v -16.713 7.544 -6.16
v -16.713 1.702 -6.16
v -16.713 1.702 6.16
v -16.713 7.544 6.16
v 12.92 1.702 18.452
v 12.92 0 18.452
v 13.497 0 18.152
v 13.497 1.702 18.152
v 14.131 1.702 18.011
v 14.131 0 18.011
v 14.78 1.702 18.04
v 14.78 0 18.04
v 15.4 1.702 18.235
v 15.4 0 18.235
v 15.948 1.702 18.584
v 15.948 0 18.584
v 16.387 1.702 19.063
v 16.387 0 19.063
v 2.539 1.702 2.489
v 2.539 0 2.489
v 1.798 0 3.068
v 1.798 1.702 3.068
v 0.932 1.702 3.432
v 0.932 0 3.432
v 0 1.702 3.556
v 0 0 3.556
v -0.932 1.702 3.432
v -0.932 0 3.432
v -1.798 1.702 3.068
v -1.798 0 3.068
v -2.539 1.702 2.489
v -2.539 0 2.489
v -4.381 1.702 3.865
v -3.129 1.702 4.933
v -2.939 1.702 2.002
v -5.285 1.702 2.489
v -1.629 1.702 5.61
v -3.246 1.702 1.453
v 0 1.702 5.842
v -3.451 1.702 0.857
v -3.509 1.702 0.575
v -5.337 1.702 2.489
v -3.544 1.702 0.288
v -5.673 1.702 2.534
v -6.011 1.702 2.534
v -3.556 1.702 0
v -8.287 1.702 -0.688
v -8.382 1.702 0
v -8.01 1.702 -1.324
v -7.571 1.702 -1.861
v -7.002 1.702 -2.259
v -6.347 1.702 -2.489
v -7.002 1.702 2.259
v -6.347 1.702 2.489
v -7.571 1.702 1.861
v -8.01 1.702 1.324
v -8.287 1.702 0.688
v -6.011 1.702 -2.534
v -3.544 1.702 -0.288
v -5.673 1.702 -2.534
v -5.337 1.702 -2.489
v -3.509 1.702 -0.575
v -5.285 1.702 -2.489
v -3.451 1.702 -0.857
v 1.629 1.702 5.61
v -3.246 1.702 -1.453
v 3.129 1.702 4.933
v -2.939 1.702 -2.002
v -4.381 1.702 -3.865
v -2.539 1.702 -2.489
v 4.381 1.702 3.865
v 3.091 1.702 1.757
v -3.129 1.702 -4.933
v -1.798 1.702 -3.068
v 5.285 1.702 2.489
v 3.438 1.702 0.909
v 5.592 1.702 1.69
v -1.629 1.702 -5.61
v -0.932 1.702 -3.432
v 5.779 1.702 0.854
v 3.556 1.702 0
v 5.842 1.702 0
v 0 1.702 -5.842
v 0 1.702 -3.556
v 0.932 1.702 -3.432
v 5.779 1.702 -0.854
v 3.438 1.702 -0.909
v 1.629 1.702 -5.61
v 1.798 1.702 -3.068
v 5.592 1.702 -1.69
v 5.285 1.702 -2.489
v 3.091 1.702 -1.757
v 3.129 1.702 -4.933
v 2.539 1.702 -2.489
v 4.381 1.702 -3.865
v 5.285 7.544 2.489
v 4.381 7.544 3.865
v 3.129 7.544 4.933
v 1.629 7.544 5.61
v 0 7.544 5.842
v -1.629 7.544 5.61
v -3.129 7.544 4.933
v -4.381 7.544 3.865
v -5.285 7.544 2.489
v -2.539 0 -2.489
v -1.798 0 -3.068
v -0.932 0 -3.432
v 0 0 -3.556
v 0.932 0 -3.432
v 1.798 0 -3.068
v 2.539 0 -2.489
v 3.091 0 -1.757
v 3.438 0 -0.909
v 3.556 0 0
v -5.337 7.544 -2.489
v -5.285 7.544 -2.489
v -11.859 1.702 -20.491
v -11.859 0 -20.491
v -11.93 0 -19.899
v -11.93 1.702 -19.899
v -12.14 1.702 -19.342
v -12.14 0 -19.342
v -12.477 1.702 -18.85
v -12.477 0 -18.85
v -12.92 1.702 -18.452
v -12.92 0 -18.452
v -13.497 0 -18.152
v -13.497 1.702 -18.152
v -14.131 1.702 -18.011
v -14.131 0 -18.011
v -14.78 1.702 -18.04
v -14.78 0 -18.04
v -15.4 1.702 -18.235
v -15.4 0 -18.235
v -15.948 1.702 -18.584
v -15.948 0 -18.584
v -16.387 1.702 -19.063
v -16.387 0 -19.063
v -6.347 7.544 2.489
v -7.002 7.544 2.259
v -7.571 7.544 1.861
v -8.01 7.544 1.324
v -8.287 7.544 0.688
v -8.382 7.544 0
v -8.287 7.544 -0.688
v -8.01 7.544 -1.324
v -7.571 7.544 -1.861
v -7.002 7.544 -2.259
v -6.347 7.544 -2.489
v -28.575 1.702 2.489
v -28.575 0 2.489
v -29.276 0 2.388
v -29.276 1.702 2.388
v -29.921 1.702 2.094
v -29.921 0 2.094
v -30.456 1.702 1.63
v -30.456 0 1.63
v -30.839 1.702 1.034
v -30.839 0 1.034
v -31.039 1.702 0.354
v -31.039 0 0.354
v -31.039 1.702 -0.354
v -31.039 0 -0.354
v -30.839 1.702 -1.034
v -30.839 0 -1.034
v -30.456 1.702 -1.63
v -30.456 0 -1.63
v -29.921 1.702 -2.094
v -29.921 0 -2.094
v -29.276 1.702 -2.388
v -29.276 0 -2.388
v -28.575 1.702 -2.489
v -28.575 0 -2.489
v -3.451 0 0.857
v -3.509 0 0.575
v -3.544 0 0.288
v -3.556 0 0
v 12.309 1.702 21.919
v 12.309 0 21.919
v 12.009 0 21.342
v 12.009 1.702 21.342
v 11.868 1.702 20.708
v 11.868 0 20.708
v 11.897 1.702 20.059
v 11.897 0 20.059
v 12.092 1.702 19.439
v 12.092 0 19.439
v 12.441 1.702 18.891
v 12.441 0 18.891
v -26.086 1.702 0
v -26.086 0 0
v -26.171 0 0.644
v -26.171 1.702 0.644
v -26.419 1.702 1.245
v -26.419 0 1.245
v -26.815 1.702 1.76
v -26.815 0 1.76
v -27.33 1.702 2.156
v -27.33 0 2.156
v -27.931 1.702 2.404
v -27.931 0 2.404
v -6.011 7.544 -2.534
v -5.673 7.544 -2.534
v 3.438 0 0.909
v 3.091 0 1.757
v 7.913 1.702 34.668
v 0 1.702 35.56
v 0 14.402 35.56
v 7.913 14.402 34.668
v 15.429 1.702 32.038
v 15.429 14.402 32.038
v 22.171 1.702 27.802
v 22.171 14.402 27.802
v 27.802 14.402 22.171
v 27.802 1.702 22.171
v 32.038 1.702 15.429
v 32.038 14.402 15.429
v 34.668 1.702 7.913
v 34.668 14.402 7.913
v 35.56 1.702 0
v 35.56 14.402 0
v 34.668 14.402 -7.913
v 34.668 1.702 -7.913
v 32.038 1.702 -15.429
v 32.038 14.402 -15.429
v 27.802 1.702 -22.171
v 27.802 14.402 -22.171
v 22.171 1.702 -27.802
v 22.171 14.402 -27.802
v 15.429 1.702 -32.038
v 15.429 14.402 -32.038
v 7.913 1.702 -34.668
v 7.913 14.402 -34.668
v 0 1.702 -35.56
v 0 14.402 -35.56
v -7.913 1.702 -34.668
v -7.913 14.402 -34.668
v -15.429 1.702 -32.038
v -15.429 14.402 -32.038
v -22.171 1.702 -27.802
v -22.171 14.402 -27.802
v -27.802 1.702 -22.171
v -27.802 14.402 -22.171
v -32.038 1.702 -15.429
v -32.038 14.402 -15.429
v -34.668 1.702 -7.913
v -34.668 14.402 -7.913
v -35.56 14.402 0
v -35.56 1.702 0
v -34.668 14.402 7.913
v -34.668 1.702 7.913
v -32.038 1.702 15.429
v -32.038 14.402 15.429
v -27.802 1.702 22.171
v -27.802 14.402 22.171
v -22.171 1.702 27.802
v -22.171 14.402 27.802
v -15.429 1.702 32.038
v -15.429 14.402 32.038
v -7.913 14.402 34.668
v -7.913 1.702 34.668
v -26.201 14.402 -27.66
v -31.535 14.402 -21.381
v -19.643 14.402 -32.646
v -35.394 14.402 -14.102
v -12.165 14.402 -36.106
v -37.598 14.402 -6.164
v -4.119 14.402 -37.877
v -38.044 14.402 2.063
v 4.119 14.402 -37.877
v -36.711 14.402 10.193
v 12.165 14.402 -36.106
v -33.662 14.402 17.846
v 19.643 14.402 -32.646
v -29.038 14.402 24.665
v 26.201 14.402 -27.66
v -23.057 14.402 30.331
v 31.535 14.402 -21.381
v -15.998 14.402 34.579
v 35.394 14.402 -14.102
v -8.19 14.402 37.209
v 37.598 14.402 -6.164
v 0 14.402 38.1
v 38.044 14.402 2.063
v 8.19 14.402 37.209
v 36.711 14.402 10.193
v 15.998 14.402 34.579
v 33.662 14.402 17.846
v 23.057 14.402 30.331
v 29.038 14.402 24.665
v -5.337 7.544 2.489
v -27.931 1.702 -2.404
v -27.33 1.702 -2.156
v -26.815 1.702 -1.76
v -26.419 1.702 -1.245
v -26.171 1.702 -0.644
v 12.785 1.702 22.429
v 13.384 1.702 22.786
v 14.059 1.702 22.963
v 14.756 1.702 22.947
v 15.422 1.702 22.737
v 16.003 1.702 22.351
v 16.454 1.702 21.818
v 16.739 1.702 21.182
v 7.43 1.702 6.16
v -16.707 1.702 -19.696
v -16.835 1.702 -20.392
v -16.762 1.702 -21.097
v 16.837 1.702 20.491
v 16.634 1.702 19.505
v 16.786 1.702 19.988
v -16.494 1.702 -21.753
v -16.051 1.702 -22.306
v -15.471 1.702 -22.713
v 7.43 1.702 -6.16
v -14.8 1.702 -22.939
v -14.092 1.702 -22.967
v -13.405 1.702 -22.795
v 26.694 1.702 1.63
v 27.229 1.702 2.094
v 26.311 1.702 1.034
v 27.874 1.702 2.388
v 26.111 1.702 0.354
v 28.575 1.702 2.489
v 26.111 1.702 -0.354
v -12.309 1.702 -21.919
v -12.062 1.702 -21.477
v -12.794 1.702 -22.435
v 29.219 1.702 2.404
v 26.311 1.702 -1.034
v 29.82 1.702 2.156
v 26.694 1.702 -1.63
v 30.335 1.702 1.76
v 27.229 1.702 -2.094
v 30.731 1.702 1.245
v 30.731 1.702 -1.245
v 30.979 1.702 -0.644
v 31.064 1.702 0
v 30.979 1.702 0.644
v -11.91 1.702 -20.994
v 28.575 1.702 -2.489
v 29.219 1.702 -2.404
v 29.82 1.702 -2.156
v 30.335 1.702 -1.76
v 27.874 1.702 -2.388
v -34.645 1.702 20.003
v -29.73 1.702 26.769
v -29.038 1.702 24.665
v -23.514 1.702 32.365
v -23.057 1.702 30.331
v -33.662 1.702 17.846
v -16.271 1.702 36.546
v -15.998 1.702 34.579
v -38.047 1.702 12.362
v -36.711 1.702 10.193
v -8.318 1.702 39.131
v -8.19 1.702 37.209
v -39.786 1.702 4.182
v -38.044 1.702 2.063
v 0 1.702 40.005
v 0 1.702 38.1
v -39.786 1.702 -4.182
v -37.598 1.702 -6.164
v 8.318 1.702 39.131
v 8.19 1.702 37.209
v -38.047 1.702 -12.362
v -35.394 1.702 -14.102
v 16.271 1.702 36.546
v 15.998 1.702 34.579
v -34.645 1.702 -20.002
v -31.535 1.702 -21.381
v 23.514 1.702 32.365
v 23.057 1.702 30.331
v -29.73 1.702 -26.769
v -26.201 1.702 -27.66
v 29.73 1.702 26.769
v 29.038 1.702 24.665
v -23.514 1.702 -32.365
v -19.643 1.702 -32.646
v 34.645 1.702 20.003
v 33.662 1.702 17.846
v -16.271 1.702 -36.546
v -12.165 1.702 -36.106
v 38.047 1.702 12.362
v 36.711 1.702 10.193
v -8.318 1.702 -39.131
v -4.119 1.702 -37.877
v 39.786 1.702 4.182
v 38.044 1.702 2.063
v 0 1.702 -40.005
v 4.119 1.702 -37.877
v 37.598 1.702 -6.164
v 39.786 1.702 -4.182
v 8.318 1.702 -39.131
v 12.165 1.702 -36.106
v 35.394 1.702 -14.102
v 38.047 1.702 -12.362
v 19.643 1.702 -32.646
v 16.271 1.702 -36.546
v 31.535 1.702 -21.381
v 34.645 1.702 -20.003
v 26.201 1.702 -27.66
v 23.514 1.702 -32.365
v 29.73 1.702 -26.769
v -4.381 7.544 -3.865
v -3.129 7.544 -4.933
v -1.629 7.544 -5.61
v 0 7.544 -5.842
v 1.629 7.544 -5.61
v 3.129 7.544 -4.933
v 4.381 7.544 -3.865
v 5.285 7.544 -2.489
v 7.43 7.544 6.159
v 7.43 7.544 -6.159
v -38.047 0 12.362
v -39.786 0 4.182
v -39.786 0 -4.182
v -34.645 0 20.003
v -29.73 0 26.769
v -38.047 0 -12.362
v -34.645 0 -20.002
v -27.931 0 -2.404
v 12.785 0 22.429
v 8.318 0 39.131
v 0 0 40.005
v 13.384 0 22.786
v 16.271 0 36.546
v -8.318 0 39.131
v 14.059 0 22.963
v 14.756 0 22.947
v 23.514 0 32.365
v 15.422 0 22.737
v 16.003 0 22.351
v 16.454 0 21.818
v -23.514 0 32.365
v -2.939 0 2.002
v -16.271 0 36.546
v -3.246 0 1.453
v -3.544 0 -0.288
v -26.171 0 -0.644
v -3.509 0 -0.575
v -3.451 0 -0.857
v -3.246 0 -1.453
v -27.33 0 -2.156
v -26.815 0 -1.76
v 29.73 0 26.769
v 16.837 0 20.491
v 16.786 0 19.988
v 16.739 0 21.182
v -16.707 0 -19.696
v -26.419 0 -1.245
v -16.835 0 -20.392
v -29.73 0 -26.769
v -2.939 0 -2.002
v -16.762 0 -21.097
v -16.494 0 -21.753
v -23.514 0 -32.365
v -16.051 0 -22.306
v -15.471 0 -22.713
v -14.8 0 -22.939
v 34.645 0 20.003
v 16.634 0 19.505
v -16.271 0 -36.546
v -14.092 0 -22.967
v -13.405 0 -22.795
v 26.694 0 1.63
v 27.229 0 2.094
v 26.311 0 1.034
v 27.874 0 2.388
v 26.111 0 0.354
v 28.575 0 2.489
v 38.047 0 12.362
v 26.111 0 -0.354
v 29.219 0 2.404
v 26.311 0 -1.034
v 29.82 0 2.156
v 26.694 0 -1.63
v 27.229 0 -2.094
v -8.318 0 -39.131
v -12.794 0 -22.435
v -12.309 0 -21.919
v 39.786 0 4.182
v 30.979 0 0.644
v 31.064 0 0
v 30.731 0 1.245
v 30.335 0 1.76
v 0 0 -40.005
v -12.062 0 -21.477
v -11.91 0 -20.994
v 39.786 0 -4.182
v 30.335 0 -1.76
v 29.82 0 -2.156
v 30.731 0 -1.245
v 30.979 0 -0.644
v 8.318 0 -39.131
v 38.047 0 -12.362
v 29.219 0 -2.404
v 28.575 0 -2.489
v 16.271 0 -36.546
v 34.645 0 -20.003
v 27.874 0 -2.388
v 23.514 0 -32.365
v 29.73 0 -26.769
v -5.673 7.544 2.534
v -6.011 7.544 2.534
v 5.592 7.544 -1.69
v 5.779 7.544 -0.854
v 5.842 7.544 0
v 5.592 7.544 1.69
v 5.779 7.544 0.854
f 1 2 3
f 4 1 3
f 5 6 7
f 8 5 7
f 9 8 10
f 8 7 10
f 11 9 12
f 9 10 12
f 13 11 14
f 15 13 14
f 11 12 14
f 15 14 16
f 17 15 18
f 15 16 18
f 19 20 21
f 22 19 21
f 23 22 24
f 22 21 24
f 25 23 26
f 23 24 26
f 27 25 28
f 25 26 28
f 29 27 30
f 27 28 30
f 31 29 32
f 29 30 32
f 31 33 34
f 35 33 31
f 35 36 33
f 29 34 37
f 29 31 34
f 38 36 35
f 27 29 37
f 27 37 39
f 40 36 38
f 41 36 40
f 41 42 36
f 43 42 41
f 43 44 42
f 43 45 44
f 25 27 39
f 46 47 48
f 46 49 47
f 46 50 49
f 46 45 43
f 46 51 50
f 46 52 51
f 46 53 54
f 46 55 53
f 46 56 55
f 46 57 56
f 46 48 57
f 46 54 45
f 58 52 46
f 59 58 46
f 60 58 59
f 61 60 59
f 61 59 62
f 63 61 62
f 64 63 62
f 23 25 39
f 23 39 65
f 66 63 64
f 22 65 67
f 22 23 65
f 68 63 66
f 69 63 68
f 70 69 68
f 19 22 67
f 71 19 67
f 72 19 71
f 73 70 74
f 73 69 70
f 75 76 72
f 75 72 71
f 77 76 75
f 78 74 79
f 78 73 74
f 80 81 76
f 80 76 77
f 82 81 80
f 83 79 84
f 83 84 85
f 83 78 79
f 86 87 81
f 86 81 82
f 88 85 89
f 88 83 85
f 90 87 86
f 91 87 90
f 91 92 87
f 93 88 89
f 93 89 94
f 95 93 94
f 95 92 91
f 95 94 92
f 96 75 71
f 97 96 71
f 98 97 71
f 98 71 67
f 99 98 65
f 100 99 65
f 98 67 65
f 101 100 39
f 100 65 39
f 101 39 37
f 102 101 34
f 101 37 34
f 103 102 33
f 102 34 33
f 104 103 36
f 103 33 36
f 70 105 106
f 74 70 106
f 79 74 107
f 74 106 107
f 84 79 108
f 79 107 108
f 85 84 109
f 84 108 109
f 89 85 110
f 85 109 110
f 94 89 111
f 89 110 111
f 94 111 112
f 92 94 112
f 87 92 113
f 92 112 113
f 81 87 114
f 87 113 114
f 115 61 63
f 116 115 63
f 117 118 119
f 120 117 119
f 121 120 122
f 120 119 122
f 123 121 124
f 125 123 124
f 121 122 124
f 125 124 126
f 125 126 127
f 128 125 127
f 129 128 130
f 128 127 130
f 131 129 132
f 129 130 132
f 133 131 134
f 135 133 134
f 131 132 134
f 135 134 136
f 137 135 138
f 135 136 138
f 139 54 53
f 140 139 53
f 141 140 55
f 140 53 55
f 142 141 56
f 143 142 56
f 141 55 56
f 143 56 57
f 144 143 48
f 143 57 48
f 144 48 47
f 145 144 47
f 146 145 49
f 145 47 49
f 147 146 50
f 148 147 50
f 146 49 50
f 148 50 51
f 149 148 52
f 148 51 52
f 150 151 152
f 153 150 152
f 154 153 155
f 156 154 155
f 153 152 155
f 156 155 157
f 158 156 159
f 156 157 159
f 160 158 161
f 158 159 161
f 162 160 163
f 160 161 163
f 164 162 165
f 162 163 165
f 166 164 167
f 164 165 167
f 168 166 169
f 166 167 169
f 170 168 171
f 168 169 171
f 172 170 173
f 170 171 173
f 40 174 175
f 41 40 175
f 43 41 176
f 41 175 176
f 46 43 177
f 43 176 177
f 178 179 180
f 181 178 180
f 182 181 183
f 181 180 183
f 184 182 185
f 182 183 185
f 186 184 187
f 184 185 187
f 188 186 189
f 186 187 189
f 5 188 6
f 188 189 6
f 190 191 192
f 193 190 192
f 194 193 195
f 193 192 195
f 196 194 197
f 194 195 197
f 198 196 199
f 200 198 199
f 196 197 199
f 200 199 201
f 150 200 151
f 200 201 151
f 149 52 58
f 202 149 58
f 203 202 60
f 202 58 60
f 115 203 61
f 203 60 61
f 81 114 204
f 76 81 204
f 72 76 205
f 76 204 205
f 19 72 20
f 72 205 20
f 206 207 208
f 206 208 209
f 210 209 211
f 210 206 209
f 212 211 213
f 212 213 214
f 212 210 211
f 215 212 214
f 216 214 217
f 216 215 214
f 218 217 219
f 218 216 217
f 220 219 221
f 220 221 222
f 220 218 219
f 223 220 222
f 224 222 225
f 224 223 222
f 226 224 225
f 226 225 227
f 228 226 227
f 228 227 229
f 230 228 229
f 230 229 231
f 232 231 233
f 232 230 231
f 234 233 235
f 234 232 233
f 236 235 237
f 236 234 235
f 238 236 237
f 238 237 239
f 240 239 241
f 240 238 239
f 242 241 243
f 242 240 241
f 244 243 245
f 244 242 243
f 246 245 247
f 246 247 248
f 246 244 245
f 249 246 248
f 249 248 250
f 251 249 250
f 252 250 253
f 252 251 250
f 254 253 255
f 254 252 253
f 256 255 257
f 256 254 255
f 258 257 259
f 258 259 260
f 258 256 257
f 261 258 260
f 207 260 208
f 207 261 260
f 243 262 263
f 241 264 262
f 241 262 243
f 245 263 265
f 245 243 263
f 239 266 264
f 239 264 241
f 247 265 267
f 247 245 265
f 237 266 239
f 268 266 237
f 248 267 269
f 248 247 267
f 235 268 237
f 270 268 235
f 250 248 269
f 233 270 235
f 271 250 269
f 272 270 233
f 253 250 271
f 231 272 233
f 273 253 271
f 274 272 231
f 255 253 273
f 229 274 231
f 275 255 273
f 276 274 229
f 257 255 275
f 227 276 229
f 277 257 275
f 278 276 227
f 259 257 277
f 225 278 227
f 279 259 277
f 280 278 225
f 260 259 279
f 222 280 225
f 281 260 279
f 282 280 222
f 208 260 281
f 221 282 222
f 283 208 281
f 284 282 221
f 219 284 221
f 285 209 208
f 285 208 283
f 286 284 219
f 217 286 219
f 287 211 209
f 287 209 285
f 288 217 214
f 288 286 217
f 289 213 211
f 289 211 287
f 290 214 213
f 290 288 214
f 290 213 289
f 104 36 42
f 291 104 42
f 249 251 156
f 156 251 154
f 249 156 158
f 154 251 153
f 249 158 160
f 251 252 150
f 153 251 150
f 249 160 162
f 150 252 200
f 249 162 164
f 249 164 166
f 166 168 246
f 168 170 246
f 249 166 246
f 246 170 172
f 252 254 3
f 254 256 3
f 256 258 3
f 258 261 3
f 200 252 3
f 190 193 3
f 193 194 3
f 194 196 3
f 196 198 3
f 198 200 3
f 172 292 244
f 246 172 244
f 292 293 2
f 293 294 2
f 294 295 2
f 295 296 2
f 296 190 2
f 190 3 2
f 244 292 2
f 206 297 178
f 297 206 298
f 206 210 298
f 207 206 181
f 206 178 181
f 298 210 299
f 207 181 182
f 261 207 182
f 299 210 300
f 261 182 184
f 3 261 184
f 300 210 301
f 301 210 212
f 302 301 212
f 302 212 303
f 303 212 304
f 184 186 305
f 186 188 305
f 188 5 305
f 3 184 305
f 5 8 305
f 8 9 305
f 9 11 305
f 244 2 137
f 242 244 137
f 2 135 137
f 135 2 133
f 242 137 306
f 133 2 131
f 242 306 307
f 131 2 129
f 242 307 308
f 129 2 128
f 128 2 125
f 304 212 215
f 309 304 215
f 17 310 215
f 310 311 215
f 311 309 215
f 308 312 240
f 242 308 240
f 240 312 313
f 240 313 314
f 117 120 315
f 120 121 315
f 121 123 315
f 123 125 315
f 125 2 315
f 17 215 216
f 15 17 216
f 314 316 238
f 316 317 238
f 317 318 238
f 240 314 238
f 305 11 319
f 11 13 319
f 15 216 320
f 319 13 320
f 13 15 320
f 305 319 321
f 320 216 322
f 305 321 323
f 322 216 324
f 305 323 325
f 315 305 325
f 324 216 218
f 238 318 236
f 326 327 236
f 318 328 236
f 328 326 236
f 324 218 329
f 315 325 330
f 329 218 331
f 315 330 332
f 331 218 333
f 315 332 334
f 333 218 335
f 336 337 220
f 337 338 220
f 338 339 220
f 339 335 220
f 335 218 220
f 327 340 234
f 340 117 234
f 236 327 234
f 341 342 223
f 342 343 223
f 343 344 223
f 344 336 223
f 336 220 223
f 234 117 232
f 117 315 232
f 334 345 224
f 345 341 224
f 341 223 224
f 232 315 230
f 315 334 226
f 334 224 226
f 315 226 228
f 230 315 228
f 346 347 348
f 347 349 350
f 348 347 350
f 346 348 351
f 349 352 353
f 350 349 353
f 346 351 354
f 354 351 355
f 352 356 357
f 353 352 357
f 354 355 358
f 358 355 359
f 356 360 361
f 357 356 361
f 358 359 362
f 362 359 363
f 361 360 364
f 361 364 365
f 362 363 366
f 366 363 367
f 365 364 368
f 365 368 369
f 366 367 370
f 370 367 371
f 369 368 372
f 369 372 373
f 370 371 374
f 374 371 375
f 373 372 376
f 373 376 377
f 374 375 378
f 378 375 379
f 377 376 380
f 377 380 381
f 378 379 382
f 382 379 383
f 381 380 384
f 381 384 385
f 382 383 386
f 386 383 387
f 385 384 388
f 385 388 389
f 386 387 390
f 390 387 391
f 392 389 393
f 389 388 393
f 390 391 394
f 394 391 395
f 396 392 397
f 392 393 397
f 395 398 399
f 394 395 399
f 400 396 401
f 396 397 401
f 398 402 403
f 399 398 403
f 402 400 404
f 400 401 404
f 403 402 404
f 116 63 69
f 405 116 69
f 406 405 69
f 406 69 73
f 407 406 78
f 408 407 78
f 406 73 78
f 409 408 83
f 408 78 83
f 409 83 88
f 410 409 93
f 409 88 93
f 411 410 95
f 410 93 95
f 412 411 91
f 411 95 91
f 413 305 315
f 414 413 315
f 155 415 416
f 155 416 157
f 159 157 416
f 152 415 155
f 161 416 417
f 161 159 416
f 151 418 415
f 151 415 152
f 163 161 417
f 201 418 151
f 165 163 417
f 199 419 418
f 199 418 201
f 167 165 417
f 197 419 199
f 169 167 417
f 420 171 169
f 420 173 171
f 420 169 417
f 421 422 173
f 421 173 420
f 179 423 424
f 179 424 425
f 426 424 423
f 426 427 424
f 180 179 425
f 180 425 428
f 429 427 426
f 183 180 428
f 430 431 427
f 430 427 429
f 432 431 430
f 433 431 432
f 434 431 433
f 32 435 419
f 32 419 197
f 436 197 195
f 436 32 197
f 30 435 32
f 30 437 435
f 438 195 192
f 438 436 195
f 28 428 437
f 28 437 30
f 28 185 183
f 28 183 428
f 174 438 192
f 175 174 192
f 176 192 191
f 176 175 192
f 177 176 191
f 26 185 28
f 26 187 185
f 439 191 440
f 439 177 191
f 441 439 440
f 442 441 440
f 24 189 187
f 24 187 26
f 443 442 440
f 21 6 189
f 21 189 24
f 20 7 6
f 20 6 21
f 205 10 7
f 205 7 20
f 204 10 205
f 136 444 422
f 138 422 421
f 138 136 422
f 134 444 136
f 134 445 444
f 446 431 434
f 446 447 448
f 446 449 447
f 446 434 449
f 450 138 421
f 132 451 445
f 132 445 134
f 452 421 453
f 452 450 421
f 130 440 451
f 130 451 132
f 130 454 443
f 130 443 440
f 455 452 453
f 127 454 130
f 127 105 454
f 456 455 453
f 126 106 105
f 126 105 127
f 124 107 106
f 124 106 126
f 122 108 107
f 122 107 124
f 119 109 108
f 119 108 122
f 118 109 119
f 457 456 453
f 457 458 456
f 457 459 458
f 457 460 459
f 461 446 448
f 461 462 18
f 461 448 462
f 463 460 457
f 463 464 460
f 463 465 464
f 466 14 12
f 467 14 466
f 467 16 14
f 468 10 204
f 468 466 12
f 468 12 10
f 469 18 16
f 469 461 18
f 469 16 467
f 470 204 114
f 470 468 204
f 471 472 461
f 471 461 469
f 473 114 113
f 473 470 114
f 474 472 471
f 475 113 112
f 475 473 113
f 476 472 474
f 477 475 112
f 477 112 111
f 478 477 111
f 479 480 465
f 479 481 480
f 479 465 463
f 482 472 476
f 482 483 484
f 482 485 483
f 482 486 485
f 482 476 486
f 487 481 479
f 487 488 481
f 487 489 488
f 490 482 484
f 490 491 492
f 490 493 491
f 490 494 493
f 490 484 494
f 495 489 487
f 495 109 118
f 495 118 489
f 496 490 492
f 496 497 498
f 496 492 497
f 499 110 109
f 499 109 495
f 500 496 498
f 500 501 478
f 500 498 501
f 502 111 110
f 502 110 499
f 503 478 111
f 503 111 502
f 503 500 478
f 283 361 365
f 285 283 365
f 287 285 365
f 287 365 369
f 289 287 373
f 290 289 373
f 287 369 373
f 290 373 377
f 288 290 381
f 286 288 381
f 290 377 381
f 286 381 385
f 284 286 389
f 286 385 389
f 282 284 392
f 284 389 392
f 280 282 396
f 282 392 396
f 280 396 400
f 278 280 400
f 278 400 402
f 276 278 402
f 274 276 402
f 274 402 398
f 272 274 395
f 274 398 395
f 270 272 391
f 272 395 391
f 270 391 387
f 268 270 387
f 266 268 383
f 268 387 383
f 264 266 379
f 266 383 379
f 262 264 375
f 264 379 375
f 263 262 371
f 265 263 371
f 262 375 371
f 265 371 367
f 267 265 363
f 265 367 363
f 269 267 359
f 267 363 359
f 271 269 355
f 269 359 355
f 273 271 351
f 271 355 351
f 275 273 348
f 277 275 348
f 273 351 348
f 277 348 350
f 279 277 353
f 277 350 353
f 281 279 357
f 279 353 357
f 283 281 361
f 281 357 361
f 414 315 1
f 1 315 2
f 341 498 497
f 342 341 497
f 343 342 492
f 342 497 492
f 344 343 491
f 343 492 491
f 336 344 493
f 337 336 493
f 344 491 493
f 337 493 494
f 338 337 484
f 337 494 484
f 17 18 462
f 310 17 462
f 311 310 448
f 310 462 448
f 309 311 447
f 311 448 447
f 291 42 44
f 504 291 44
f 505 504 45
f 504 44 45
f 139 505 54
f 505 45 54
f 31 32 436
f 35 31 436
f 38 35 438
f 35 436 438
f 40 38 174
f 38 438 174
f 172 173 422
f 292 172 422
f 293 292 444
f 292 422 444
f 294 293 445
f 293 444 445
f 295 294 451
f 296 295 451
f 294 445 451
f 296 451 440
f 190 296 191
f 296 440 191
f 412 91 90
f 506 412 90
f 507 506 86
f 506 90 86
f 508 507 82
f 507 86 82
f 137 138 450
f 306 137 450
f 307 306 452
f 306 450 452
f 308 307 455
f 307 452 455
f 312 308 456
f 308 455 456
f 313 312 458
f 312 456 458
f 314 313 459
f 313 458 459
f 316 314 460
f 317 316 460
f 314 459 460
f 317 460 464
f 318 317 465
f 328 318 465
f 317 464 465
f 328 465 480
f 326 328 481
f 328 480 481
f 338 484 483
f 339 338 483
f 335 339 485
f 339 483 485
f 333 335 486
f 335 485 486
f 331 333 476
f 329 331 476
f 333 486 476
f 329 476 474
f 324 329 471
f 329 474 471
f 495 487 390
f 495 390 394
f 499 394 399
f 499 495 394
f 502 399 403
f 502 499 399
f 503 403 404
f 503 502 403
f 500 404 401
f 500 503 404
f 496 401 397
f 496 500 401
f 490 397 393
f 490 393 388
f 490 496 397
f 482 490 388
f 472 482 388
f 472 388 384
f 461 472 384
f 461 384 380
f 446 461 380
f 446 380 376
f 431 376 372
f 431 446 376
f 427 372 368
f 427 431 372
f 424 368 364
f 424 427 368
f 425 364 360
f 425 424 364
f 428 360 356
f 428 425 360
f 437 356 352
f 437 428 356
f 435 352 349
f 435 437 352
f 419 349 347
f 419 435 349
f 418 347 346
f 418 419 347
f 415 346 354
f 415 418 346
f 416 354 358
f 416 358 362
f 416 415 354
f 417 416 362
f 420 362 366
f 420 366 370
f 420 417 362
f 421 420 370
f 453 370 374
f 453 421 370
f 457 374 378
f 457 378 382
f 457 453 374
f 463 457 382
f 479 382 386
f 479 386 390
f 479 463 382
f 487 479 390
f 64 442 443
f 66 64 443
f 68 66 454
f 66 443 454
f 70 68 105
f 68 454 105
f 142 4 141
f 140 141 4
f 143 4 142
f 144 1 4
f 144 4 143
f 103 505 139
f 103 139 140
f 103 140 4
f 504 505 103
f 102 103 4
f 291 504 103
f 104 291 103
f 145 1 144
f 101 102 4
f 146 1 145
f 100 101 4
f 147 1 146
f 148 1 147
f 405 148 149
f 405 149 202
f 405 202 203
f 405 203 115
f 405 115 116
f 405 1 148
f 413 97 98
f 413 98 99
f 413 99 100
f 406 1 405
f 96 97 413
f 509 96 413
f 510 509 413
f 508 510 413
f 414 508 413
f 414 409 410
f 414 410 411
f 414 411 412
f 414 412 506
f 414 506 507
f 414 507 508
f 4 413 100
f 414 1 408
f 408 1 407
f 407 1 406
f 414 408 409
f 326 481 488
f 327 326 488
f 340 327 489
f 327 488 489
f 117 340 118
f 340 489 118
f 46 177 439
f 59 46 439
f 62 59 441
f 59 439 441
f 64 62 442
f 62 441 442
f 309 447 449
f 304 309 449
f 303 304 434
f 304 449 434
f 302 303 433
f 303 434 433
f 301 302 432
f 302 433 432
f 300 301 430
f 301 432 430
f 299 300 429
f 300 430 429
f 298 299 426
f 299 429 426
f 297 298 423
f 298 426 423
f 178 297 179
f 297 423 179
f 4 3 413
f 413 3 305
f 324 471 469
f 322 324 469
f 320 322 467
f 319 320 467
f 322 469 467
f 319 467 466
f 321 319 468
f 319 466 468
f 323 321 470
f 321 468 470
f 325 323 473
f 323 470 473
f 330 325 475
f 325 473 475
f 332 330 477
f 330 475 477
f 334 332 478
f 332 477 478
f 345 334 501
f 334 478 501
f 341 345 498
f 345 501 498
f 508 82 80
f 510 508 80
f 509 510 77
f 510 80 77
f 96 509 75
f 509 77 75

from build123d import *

# Parameters (mm, degrees)
SKETCH1_W           = 1.5875
SKETCH1_H           = 3.6703
BOSS_EXTRUDE1_DEPTH = 1.7018
BOSS_EXTRUDE2_START = 1.7018
SKETCH1_4_W         = 1.5875
SKETCH1_4_H         = 3.6703
BOSS_EXTRUDE2_DEPTH = 5.842
BOSS_EXTRUDE3_START = -7.5438
BOSS_EXTRUDE3_DEPTH = 1.7018
SKETCH5_R           = 40.005
BOSS_EXTRUDE5_DEPTH = 1.7018
SKETCH6_R           = 38.1
SKETCH6_R_2         = 35.56
BOSS_EXTRUDE6_DEPTH = 12.7


with BuildPart() as part:
    # Sketch1 → Boss-Extrude1 (new body)
    with BuildSketch(Plane(origin=(0, 0, 0), x_dir=(1, 0, 0), z_dir=(0, 1, 0))):
        with BuildLine():
            ThreePointArc((-24.13, 0), (-24.32485867, 1.301661891), (-24.892350361, 2.4892))
            Line((-24.892350361, 2.4892), (-28.575, 2.4892))
            ThreePointArc((-28.575, 2.4892), (-26.8148698, 1.7601302), (-26.0858, 0))
            ThreePointArc((-26.0858, 0), (-26.8148698, -1.7601302), (-28.575, -2.4892))
            Line((-28.575, -2.4892), (-24.892350361, -2.4892))
            ThreePointArc((-24.892350361, -2.4892), (-24.32485867, -1.301661891), (-24.13, 0))
        make_face()
        with BuildLine():
            Line((-28.575, 2.4892), (-24.892350361, 2.4892))
            ThreePointArc((-24.892350361, 2.4892), (-33.02, 0), (-24.892350361, -2.4892))
            Line((-24.892350361, -2.4892), (-28.575, -2.4892))
            ThreePointArc((-28.575, -2.4892), (-31.0642, 0), (-28.575, 2.4892))
        make_face()
        with BuildLine():
            ThreePointArc((-24.13, 0), (-24.32485867, 1.301661891), (-24.892350361, 2.4892))
            Line((-24.892350361, 2.4892), (-28.575, 2.4892))
            ThreePointArc((-28.575, 2.4892), (-26.8148698, 1.7601302), (-26.0858, 0))
            ThreePointArc((-26.0858, 0), (-26.8148698, -1.7601302), (-28.575, -2.4892))
            Line((-28.575, -2.4892), (-24.892350361, -2.4892))
            ThreePointArc((-24.892350361, -2.4892), (-24.32485867, -1.301661891), (-24.13, 0))
        make_face()
        with BuildLine():
            Line((-28.575, 2.4892), (-24.892350361, 2.4892))
            ThreePointArc((-24.892350361, 2.4892), (-33.02, 0), (-24.892350361, -2.4892))
            Line((-24.892350361, -2.4892), (-28.575, -2.4892))
            ThreePointArc((-28.575, -2.4892), (-31.0642, 0), (-28.575, 2.4892))
        make_face()
        with BuildLine():
            Line((-16.7132, 0), (-16.7132, 2.4892))
            Line((-16.7132, 2.4892), (-24.892350361, 2.4892))
            ThreePointArc((-24.892350361, 2.4892), (-24.32485867, 1.301661891), (-24.13, 0))
            ThreePointArc((-24.13, 0), (-24.32485867, -1.301661891), (-24.892350361, -2.4892))
            Line((-24.892350361, -2.4892), (-16.7132, -2.4892))
            Line((-16.7132, -2.4892), (-16.7132, 0))
        make_face()
        with BuildLine():
            Line((5.842, -6.1595), (5.842, -2.4892))
            Line((5.842, -2.4892), (5.285153485, -2.4892))
            ThreePointArc((5.285153485, -2.4892), (0, -5.842), (-5.285153485, -2.4892))
            Line((-5.285153485, -2.4892), (-5.336546382, -2.4892))
            ThreePointArc((-5.336546382, -2.4892), (-5.842, -2.54), (-6.347453618, -2.4892))
            Line((-6.347453618, -2.4892), (-16.7132, -2.4892))
            Line((-16.7132, -2.4892), (-16.7132, -6.1595))
            Line((-16.7132, -6.1595), (5.842, -6.1595))
        make_face()
        with BuildLine():
            Line((-16.7132, 0), (-16.7132, -2.4892))
            Line((-16.7132, -2.4892), (-6.347453618, -2.4892))
            ThreePointArc((-6.347453618, -2.4892), (-7.808653527, -1.607443282), (-8.382, 0))
            Line((-8.382, 0), (-16.7132, 0))
        make_face()
        with BuildLine():
            Line((-6.347453618, 2.4892), (-16.7132, 2.4892))
            Line((-16.7132, 2.4892), (-16.7132, 0))
            Line((-16.7132, 0), (-8.382, 0))
            ThreePointArc((-8.382, 0), (-7.808653527, 1.607443282), (-6.347453618, 2.4892))
        make_face()
        with BuildLine():
            Line((5.285153485, 2.4892), (5.842, 2.4892))
            Line((5.842, 2.4892), (5.842, 6.1595))
            Line((5.842, 6.1595), (-16.7132, 6.1595))
            Line((-16.7132, 6.1595), (-16.7132, 2.4892))
            Line((-16.7132, 2.4892), (-6.347453618, 2.4892))
            ThreePointArc((-6.347453618, 2.4892), (-5.842, 2.54), (-5.336546382, 2.4892))
            Line((-5.336546382, 2.4892), (-5.285153485, 2.4892))
            ThreePointArc((-5.285153485, 2.4892), (0, 5.842), (5.285153485, 2.4892))
        make_face()
        with Locations((6.63575, 4.32435)):
            Rectangle(SKETCH1_W, SKETCH1_H)
        with Locations((6.63575, -4.32435)):
            Rectangle(SKETCH1_W, SKETCH1_H)
        Polygon((5.842, 2.4892), (5.842, 0), (5.842, -2.4892), (7.4295, -2.4892), (7.4295, 2.4892), align=None)
        with BuildLine():
            ThreePointArc((5.285153485, 2.4892), (5.70108896, 1.275362172), (5.842, 0))
            Line((5.842, 0), (5.842, 2.4892))
            Line((5.842, 2.4892), (5.285153485, 2.4892))
        make_face()
        with BuildLine():
            Line((5.842, -2.4892), (5.842, 0))
            ThreePointArc((5.842, 0), (5.70108896, -1.275362172), (5.285153485, -2.4892))
            Line((5.285153485, -2.4892), (5.842, -2.4892))
        make_face()
        with BuildLine():
            ThreePointArc((5.285153485, -2.4892), (5.70108896, -1.275362172), (5.842, 0))
            Line((5.842, 0), (3.556, 0))
            ThreePointArc((3.556, 0), (3.292079083, -1.344377668), (2.539491949, -2.4892))
            Line((2.539491949, -2.4892), (5.285153485, -2.4892))
        make_face()
        with BuildLine():
            Line((3.556, 0), (5.842, 0))
            ThreePointArc((5.842, 0), (5.70108896, 1.275362172), (5.285153485, 2.4892))
            Line((5.285153485, 2.4892), (2.539491949, 2.4892))
            ThreePointArc((2.539491949, 2.4892), (3.292079083, 1.344377668), (3.556, 0))
        make_face()
        with BuildLine():
            Line((2.539491949, 2.4892), (5.285153485, 2.4892))
            ThreePointArc((5.285153485, 2.4892), (0, 5.842), (-5.285153485, 2.4892))
            Line((-5.285153485, 2.4892), (-2.539491949, 2.4892))
            ThreePointArc((-2.539491949, 2.4892), (0, 3.556), (2.539491949, 2.4892))
        make_face()
        with BuildLine():
            ThreePointArc((-5.285153485, -2.4892), (0, -5.842), (5.285153485, -2.4892))
            Line((5.285153485, -2.4892), (2.539491949, -2.4892))
            ThreePointArc((2.539491949, -2.4892), (0, -3.556), (-2.539491949, -2.4892))
            Line((-2.539491949, -2.4892), (-5.285153485, -2.4892))
        make_face()
        with BuildLine():
            ThreePointArc((-5.289826087, -2.479254721), (-5.287492124, -2.484228459), (-5.285153485, -2.4892))
            Line((-5.285153485, -2.4892), (-2.539491949, -2.4892))
            ThreePointArc((-2.539491949, -2.4892), (-3.104424534, -1.734267659), (-3.451086957, -0.857400034))
            ThreePointArc((-3.451086957, -0.857400034), (-4.161808533, -1.904877066), (-5.289826087, -2.479254721))
        make_face()
        with BuildLine():
            Line((-2.539491949, 2.4892), (-5.285153485, 2.4892))
            ThreePointArc((-5.285153485, 2.4892), (-5.287492124, 2.484228459), (-5.289826087, 2.479254721))
            ThreePointArc((-5.289826087, 2.479254721), (-4.161808533, 1.904877066), (-3.451086957, 0.857400034))
            ThreePointArc((-3.451086957, 0.857400034), (-3.104424534, 1.734267659), (-2.539491949, 2.4892))
        make_face()
        with BuildLine():
            Line((24.892350361, 2.4892), (7.4295, 2.4892))
            Line((7.4295, 2.4892), (7.4295, -2.4892))
            Line((7.4295, -2.4892), (24.892350361, -2.4892))
            ThreePointArc((24.892350361, -2.4892), (24.13, 0), (24.892350361, 2.4892))
        make_face()
        with BuildLine():
            ThreePointArc((33.02, 0), (29.876661891, 4.25014133), (24.892350361, 2.4892))
            Line((24.892350361, 2.4892), (28.575, 2.4892))
            ThreePointArc((28.575, 2.4892), (30.3351302, 1.7601302), (31.0642, 0))
            ThreePointArc((31.0642, 0), (30.3351302, -1.7601302), (28.575, -2.4892))
            Line((28.575, -2.4892), (24.892350361, -2.4892))
            ThreePointArc((24.892350361, -2.4892), (29.876661891, -4.25014133), (33.02, 0))
        make_face()
        with BuildLine():
            Line((28.575, 2.4892), (24.892350361, 2.4892))
            ThreePointArc((24.892350361, 2.4892), (24.13, 0), (24.892350361, -2.4892))
            Line((24.892350361, -2.4892), (28.575, -2.4892))
            ThreePointArc((28.575, -2.4892), (26.0858, 0), (28.575, 2.4892))
        make_face()
        with BuildLine():
            ThreePointArc((33.02, 0), (29.876661891, 4.25014133), (24.892350361, 2.4892))
            Line((24.892350361, 2.4892), (28.575, 2.4892))
            ThreePointArc((28.575, 2.4892), (30.3351302, 1.7601302), (31.0642, 0))
            ThreePointArc((31.0642, 0), (30.3351302, -1.7601302), (28.575, -2.4892))
            Line((28.575, -2.4892), (24.892350361, -2.4892))
            ThreePointArc((24.892350361, -2.4892), (29.876661891, -4.25014133), (33.02, 0))
        make_face()
        with BuildLine():
            Line((28.575, 2.4892), (24.892350361, 2.4892))
            ThreePointArc((24.892350361, 2.4892), (24.13, 0), (24.892350361, -2.4892))
            Line((24.892350361, -2.4892), (28.575, -2.4892))
            ThreePointArc((28.575, -2.4892), (26.0858, 0), (28.575, 2.4892))
        make_face()
        with BuildLine():
            ThreePointArc((-3.451086957, -0.857400034), (-3.529674292, -0.431897431), (-3.556, 0))
            Line((-3.556, 0), (-5.842, 0))
            ThreePointArc((-5.842, 0), (-5.702285857, -1.27), (-5.289826087, -2.479254721))
            ThreePointArc((-5.289826087, -2.479254721), (-4.161808533, -1.904877066), (-3.451086957, -0.857400034))
        make_face()
        with BuildLine():
            Line((-5.842, 0), (-3.556, 0))
            ThreePointArc((-3.556, 0), (-3.529674292, 0.431897431), (-3.451086957, 0.857400034))
            ThreePointArc((-3.451086957, 0.857400034), (-4.161808533, 1.904877066), (-5.289826087, 2.479254721))
            ThreePointArc((-5.289826087, 2.479254721), (-5.702285857, 1.27), (-5.842, 0))
        make_face()
        with BuildLine():
            ThreePointArc((-3.451086957, -0.857400034), (-3.529674292, -0.431897431), (-3.556, 0))
            Line((-3.556, 0), (-5.842, 0))
            ThreePointArc((-5.842, 0), (-5.702285857, -1.27), (-5.289826087, -2.479254721))
            ThreePointArc((-5.289826087, -2.479254721), (-4.161808533, -1.904877066), (-3.451086957, -0.857400034))
        make_face()
        with BuildLine():
            Line((-5.842, 0), (-3.556, 0))
            ThreePointArc((-3.556, 0), (-3.529674292, 0.431897431), (-3.451086957, 0.857400034))
            ThreePointArc((-3.451086957, 0.857400034), (-4.161808533, 1.904877066), (-5.289826087, 2.479254721))
            ThreePointArc((-5.289826087, 2.479254721), (-5.702285857, 1.27), (-5.842, 0))
        make_face()
        with BuildLine():
            Line((-6.347453618, 2.4892), (-5.336546382, 2.4892))
            ThreePointArc((-5.336546382, 2.4892), (-5.842, 2.54), (-6.347453618, 2.4892))
        make_face()
        with BuildLine():
            ThreePointArc((-5.289826087, 2.479254721), (-5.313162855, 2.48433719), (-5.336546382, 2.4892))
            Line((-5.336546382, 2.4892), (-6.347453618, 2.4892))
            ThreePointArc((-6.347453618, 2.4892), (-7.808653527, 1.607443282), (-8.382, 0))
            Line((-8.382, 0), (-5.842, 0))
            ThreePointArc((-5.842, 0), (-5.702285857, 1.27), (-5.289826087, 2.479254721))
        make_face()
        with BuildLine():
            ThreePointArc((-6.347453618, -2.4892), (-5.842, -2.54), (-5.336546382, -2.4892))
            Line((-5.336546382, -2.4892), (-6.347453618, -2.4892))
        make_face()
        with BuildLine():
            Line((-6.347453618, -2.4892), (-5.336546382, -2.4892))
            ThreePointArc((-5.336546382, -2.4892), (-5.313162855, -2.48433719), (-5.289826087, -2.479254721))
            ThreePointArc((-5.289826087, -2.479254721), (-5.702285857, -1.27), (-5.842, 0))
            Line((-5.842, 0), (-8.382, 0))
            ThreePointArc((-8.382, 0), (-7.808653527, -1.607443282), (-6.347453618, -2.4892))
        make_face()
        with BuildLine():
            Line((-5.336546382, -2.4892), (-5.285153485, -2.4892))
            ThreePointArc((-5.285153485, -2.4892), (-5.287492124, -2.484228459), (-5.289826087, -2.479254721))
            ThreePointArc((-5.289826087, -2.479254721), (-5.313162855, -2.48433719), (-5.336546382, -2.4892))
        make_face()
        with BuildLine():
            ThreePointArc((-5.289826087, 2.479254721), (-5.287492124, 2.484228459), (-5.285153485, 2.4892))
            Line((-5.285153485, 2.4892), (-5.336546382, 2.4892))
            ThreePointArc((-5.336546382, 2.4892), (-5.313162855, 2.48433719), (-5.289826087, 2.479254721))
        make_face()
    extrude(amount=BOSS_EXTRUDE1_DEPTH)

    # Sketch1<4> → Boss-Extrude2 (add)
    with BuildSketch(Plane(origin=(0, 0, 0), x_dir=(1, 0, 0), z_dir=(0, 1, 0)).offset(BOSS_EXTRUDE2_START)):
        with BuildLine():
            Line((5.842, -6.1595), (5.842, -2.4892))
            Line((5.842, -2.4892), (5.285153485, -2.4892))
            ThreePointArc((5.285153485, -2.4892), (0, -5.842), (-5.285153485, -2.4892))
            Line((-5.285153485, -2.4892), (-5.336546382, -2.4892))
            ThreePointArc((-5.336546382, -2.4892), (-5.842, -2.54), (-6.347453618, -2.4892))
            Line((-6.347453618, -2.4892), (-16.7132, -2.4892))
            Line((-16.7132, -2.4892), (-16.7132, -6.1595))
            Line((-16.7132, -6.1595), (5.842, -6.1595))
        make_face()
        with BuildLine():
            Line((-6.347453618, 2.4892), (-16.7132, 2.4892))
            Line((-16.7132, 2.4892), (-16.7132, 0))
            Line((-16.7132, 0), (-8.382, 0))
            ThreePointArc((-8.382, 0), (-7.808653527, 1.607443282), (-6.347453618, 2.4892))
        make_face()
        with BuildLine():
            Line((5.285153485, 2.4892), (5.842, 2.4892))
            Line((5.842, 2.4892), (5.842, 6.1595))
            Line((5.842, 6.1595), (-16.7132, 6.1595))
            Line((-16.7132, 6.1595), (-16.7132, 2.4892))
            Line((-16.7132, 2.4892), (-6.347453618, 2.4892))
            ThreePointArc((-6.347453618, 2.4892), (-5.842, 2.54), (-5.336546382, 2.4892))
            Line((-5.336546382, 2.4892), (-5.285153485, 2.4892))
            ThreePointArc((-5.285153485, 2.4892), (0, 5.842), (5.285153485, 2.4892))
        make_face()
        with Locations((6.63575, 4.32435)):
            Rectangle(SKETCH1_4_W, SKETCH1_4_H)
        Polygon((5.842, 2.4892), (5.842, 0), (5.842, -2.4892), (7.4295, -2.4892), (7.4295, 2.4892), align=None)
        with Locations((6.63575, -4.32435)):
            Rectangle(SKETCH1_4_W, SKETCH1_4_H)
        with BuildLine():
            Line((5.842, -2.4892), (5.842, 0))
            ThreePointArc((5.842, 0), (5.70108896, -1.275362172), (5.285153485, -2.4892))
            Line((5.285153485, -2.4892), (5.842, -2.4892))
        make_face()
        with BuildLine():
            ThreePointArc((5.285153485, 2.4892), (5.70108896, 1.275362172), (5.842, 0))
            Line((5.842, 0), (5.842, 2.4892))
            Line((5.842, 2.4892), (5.285153485, 2.4892))
        make_face()
        with BuildLine():
            Line((-16.7132, 0), (-16.7132, -2.4892))
            Line((-16.7132, -2.4892), (-6.347453618, -2.4892))
            ThreePointArc((-6.347453618, -2.4892), (-7.808653527, -1.607443282), (-8.382, 0))
            Line((-8.382, 0), (-16.7132, 0))
        make_face()
    extrude(amount=BOSS_EXTRUDE2_DEPTH)

    # Sketch3 → Boss-Extrude3 (add)
    with BuildSketch(Plane(origin=(0, 7.5438, 0), x_dir=(1, 0, 0), z_dir=(0, 1, 0)).offset(BOSS_EXTRUDE3_START)):
        with BuildLine():
            ThreePointArc((-11.858814555, 20.491088388), (-12.140067189, 19.34170374), (-12.92026809, 18.452055119))
            Line((-12.92026809, 18.452055119), (-11.798467296, 16.849957551))
            ThreePointArc((-11.798467296, 16.849957551), (-10.843974639, 17.756179018), (-10.196700231, 18.902184873))
            Line((-10.196700231, 18.902184873), (-12.308981287, 21.918834853))
            ThreePointArc((-12.308981287, 21.918834853), (-11.974022322, 21.239605264), (-11.858814555, 20.491088388))
        make_face()
        with BuildLine():
            Line((-14.274766768, 16.046691943), (-16.387047824, 19.063341923))
            ThreePointArc((-16.387047824, 19.063341923), (-15.775761021, 22.530121657), (-12.308981287, 21.918834853))
            Line((-12.308981287, 21.918834853), (-10.196700231, 18.902184873))
            ThreePointArc((-10.196700231, 18.902184873), (-9.97705258, 19.683179721), (-9.903014555, 20.491088388))
            ThreePointArc((-9.903014555, 20.491088388), (-17.516895384, 23.608173451), (-14.274766768, 16.046691943))
        make_face()
        with BuildLine():
            Line((-11.798467296, 16.849957551), (-12.92026809, 18.452055119))
            ThreePointArc((-12.92026809, 18.452055119), (-14.780259599, 18.039704929), (-16.387047824, 19.063341923))
            Line((-16.387047824, 19.063341923), (-14.274766768, 16.046691943))
            ThreePointArc((-14.274766768, 16.046691943), (-12.976492636, 16.26297384), (-11.798467296, 16.849957551))
        make_face()
        with BuildLine():
            Line((-4.312928332, 6.1595), (-11.798467296, 16.849957551))
            ThreePointArc((-11.798467296, 16.849957551), (-12.976492636, 16.26297384), (-14.274766768, 16.046691943))
            Line((-14.274766768, 16.046691943), (-7.351680438, 6.1595))
            Line((-7.351680438, 6.1595), (-4.312928332, 6.1595))
        make_face()
        with BuildLine():
            ThreePointArc((-10.196700231, 18.902184873), (-10.843974639, 17.756179018), (-11.798467296, 16.849957551))
            Line((-11.798467296, 16.849957551), (-4.312928332, 6.1595))
            Line((-4.312928332, 6.1595), (-1.274176225, 6.1595))
            Line((-1.274176225, 6.1595), (-10.196700231, 18.902184873))
        make_face()
        with BuildLine():
            Line((11.798467296, -16.849957551), (4.312928332, -6.1595))
            Line((4.312928332, -6.1595), (1.274176225, -6.1595))
            Line((1.274176225, -6.1595), (10.196700231, -18.902184873))
            ThreePointArc((10.196700231, -18.902184873), (10.843974639, -17.756179018), (11.798467296, -16.849957551))
        make_face()
        with BuildLine():
            Line((7.351680438, -6.1595), (4.312928332, -6.1595))
            Line((4.312928332, -6.1595), (11.798467296, -16.849957551))
            ThreePointArc((11.798467296, -16.849957551), (12.976492636, -16.26297384), (14.274766768, -16.046691943))
            Line((14.274766768, -16.046691943), (7.351680438, -6.1595))
        make_face()
        with BuildLine():
            ThreePointArc((18.793014555, -20.491088388), (17.465099619, -17.322207559), (14.274766768, -16.046691943))
            Line((14.274766768, -16.046691943), (16.387047824, -19.063341923))
            ThreePointArc((16.387047824, -19.063341923), (16.722006789, -19.742571512), (16.837214555, -20.491088388))
            ThreePointArc((16.837214555, -20.491088388), (15.096531431, -22.865080622), (12.308981287, -21.918834853))
            Line((12.308981287, -21.918834853), (10.196700231, -18.902184873))
            ThreePointArc((10.196700231, -18.902184873), (13.540105889, -24.862050363), (18.793014555, -20.491088388))
        make_face()
        with BuildLine():
            ThreePointArc((14.274766768, -16.046691943), (12.976492636, -16.26297384), (11.798467296, -16.849957551))
            Line((11.798467296, -16.849957551), (12.92026809, -18.452055119))
            ThreePointArc((12.92026809, -18.452055119), (14.780259599, -18.039704929), (16.387047824, -19.063341923))
            Line((16.387047824, -19.063341923), (14.274766768, -16.046691943))
        make_face()
        with BuildLine():
            Line((12.92026809, -18.452055119), (11.798467296, -16.849957551))
            ThreePointArc((11.798467296, -16.849957551), (10.843974639, -17.756179018), (10.196700231, -18.902184873))
            Line((10.196700231, -18.902184873), (12.308981287, -21.918834853))
            ThreePointArc((12.308981287, -21.918834853), (11.896631097, -20.058843344), (12.92026809, -18.452055119))
        make_face()
    extrude(amount=BOSS_EXTRUDE3_DEPTH)

    # Sketch5 → Boss-Extrude5 (add)
    with BuildSketch(Plane.XZ):
        with Locations(Location((0, 0, 0), (0, 0, 270))):
            Circle(SKETCH5_R)
        with BuildLine():
            Line((7.4295, 2.4892), (7.4295, 6.1595))
            Line((7.4295, 6.1595), (7.351680438, 6.1595))
            Line((7.351680438, 6.1595), (14.274766768, 16.046691943))
            ThreePointArc((14.274766768, 16.046691943), (16.897561815, 24.132219225), (10.196700231, 18.902184873))
            Line((10.196700231, 18.902184873), (1.274176225, 6.1595))
            Line((1.274176225, 6.1595), (-16.7132, 6.1595))
            Line((-16.7132, 6.1595), (-16.7132, 2.4892))
            Line((-16.7132, 2.4892), (-24.892350361, 2.4892))
            ThreePointArc((-24.892350361, 2.4892), (-33.02, 0), (-24.892350361, -2.4892))
            Line((-24.892350361, -2.4892), (-16.7132, -2.4892))
            Line((-16.7132, -2.4892), (-16.7132, -6.1595))
            Line((-16.7132, -6.1595), (-7.351680438, -6.1595))
            Line((-7.351680438, -6.1595), (-14.274766768, -16.046691943))
            ThreePointArc((-14.274766768, -16.046691943), (-16.897561815, -24.132219225), (-10.196700231, -18.902184873))
            Line((-10.196700231, -18.902184873), (-1.274176225, -6.1595))
            Line((-1.274176225, -6.1595), (7.4295, -6.1595))
            Line((7.4295, -6.1595), (7.4295, -2.4892))
            Line((7.4295, -2.4892), (24.892350361, -2.4892))
            ThreePointArc((24.892350361, -2.4892), (33.02, 0), (24.892350361, 2.4892))
            Line((24.892350361, 2.4892), (7.4295, 2.4892))
        make_face(mode=Mode.SUBTRACT)
    extrude(amount=-BOSS_EXTRUDE5_DEPTH)

    # Sketch6 → Boss-Extrude6 (add)
    with BuildSketch(Plane(origin=(0, 1.7018, 0), x_dir=(1, 0, 0), z_dir=(0, 1, 0))):
        with Locations(Location((0, 0, 0), (0, 0, 270))):
            Circle(SKETCH6_R)
        with Locations(Location((0, 0, 0), (0, 0, 270))):
            Circle(SKETCH6_R_2, mode=Mode.SUBTRACT)
    extrude(amount=BOSS_EXTRUDE6_DEPTH)


solid = part.part
